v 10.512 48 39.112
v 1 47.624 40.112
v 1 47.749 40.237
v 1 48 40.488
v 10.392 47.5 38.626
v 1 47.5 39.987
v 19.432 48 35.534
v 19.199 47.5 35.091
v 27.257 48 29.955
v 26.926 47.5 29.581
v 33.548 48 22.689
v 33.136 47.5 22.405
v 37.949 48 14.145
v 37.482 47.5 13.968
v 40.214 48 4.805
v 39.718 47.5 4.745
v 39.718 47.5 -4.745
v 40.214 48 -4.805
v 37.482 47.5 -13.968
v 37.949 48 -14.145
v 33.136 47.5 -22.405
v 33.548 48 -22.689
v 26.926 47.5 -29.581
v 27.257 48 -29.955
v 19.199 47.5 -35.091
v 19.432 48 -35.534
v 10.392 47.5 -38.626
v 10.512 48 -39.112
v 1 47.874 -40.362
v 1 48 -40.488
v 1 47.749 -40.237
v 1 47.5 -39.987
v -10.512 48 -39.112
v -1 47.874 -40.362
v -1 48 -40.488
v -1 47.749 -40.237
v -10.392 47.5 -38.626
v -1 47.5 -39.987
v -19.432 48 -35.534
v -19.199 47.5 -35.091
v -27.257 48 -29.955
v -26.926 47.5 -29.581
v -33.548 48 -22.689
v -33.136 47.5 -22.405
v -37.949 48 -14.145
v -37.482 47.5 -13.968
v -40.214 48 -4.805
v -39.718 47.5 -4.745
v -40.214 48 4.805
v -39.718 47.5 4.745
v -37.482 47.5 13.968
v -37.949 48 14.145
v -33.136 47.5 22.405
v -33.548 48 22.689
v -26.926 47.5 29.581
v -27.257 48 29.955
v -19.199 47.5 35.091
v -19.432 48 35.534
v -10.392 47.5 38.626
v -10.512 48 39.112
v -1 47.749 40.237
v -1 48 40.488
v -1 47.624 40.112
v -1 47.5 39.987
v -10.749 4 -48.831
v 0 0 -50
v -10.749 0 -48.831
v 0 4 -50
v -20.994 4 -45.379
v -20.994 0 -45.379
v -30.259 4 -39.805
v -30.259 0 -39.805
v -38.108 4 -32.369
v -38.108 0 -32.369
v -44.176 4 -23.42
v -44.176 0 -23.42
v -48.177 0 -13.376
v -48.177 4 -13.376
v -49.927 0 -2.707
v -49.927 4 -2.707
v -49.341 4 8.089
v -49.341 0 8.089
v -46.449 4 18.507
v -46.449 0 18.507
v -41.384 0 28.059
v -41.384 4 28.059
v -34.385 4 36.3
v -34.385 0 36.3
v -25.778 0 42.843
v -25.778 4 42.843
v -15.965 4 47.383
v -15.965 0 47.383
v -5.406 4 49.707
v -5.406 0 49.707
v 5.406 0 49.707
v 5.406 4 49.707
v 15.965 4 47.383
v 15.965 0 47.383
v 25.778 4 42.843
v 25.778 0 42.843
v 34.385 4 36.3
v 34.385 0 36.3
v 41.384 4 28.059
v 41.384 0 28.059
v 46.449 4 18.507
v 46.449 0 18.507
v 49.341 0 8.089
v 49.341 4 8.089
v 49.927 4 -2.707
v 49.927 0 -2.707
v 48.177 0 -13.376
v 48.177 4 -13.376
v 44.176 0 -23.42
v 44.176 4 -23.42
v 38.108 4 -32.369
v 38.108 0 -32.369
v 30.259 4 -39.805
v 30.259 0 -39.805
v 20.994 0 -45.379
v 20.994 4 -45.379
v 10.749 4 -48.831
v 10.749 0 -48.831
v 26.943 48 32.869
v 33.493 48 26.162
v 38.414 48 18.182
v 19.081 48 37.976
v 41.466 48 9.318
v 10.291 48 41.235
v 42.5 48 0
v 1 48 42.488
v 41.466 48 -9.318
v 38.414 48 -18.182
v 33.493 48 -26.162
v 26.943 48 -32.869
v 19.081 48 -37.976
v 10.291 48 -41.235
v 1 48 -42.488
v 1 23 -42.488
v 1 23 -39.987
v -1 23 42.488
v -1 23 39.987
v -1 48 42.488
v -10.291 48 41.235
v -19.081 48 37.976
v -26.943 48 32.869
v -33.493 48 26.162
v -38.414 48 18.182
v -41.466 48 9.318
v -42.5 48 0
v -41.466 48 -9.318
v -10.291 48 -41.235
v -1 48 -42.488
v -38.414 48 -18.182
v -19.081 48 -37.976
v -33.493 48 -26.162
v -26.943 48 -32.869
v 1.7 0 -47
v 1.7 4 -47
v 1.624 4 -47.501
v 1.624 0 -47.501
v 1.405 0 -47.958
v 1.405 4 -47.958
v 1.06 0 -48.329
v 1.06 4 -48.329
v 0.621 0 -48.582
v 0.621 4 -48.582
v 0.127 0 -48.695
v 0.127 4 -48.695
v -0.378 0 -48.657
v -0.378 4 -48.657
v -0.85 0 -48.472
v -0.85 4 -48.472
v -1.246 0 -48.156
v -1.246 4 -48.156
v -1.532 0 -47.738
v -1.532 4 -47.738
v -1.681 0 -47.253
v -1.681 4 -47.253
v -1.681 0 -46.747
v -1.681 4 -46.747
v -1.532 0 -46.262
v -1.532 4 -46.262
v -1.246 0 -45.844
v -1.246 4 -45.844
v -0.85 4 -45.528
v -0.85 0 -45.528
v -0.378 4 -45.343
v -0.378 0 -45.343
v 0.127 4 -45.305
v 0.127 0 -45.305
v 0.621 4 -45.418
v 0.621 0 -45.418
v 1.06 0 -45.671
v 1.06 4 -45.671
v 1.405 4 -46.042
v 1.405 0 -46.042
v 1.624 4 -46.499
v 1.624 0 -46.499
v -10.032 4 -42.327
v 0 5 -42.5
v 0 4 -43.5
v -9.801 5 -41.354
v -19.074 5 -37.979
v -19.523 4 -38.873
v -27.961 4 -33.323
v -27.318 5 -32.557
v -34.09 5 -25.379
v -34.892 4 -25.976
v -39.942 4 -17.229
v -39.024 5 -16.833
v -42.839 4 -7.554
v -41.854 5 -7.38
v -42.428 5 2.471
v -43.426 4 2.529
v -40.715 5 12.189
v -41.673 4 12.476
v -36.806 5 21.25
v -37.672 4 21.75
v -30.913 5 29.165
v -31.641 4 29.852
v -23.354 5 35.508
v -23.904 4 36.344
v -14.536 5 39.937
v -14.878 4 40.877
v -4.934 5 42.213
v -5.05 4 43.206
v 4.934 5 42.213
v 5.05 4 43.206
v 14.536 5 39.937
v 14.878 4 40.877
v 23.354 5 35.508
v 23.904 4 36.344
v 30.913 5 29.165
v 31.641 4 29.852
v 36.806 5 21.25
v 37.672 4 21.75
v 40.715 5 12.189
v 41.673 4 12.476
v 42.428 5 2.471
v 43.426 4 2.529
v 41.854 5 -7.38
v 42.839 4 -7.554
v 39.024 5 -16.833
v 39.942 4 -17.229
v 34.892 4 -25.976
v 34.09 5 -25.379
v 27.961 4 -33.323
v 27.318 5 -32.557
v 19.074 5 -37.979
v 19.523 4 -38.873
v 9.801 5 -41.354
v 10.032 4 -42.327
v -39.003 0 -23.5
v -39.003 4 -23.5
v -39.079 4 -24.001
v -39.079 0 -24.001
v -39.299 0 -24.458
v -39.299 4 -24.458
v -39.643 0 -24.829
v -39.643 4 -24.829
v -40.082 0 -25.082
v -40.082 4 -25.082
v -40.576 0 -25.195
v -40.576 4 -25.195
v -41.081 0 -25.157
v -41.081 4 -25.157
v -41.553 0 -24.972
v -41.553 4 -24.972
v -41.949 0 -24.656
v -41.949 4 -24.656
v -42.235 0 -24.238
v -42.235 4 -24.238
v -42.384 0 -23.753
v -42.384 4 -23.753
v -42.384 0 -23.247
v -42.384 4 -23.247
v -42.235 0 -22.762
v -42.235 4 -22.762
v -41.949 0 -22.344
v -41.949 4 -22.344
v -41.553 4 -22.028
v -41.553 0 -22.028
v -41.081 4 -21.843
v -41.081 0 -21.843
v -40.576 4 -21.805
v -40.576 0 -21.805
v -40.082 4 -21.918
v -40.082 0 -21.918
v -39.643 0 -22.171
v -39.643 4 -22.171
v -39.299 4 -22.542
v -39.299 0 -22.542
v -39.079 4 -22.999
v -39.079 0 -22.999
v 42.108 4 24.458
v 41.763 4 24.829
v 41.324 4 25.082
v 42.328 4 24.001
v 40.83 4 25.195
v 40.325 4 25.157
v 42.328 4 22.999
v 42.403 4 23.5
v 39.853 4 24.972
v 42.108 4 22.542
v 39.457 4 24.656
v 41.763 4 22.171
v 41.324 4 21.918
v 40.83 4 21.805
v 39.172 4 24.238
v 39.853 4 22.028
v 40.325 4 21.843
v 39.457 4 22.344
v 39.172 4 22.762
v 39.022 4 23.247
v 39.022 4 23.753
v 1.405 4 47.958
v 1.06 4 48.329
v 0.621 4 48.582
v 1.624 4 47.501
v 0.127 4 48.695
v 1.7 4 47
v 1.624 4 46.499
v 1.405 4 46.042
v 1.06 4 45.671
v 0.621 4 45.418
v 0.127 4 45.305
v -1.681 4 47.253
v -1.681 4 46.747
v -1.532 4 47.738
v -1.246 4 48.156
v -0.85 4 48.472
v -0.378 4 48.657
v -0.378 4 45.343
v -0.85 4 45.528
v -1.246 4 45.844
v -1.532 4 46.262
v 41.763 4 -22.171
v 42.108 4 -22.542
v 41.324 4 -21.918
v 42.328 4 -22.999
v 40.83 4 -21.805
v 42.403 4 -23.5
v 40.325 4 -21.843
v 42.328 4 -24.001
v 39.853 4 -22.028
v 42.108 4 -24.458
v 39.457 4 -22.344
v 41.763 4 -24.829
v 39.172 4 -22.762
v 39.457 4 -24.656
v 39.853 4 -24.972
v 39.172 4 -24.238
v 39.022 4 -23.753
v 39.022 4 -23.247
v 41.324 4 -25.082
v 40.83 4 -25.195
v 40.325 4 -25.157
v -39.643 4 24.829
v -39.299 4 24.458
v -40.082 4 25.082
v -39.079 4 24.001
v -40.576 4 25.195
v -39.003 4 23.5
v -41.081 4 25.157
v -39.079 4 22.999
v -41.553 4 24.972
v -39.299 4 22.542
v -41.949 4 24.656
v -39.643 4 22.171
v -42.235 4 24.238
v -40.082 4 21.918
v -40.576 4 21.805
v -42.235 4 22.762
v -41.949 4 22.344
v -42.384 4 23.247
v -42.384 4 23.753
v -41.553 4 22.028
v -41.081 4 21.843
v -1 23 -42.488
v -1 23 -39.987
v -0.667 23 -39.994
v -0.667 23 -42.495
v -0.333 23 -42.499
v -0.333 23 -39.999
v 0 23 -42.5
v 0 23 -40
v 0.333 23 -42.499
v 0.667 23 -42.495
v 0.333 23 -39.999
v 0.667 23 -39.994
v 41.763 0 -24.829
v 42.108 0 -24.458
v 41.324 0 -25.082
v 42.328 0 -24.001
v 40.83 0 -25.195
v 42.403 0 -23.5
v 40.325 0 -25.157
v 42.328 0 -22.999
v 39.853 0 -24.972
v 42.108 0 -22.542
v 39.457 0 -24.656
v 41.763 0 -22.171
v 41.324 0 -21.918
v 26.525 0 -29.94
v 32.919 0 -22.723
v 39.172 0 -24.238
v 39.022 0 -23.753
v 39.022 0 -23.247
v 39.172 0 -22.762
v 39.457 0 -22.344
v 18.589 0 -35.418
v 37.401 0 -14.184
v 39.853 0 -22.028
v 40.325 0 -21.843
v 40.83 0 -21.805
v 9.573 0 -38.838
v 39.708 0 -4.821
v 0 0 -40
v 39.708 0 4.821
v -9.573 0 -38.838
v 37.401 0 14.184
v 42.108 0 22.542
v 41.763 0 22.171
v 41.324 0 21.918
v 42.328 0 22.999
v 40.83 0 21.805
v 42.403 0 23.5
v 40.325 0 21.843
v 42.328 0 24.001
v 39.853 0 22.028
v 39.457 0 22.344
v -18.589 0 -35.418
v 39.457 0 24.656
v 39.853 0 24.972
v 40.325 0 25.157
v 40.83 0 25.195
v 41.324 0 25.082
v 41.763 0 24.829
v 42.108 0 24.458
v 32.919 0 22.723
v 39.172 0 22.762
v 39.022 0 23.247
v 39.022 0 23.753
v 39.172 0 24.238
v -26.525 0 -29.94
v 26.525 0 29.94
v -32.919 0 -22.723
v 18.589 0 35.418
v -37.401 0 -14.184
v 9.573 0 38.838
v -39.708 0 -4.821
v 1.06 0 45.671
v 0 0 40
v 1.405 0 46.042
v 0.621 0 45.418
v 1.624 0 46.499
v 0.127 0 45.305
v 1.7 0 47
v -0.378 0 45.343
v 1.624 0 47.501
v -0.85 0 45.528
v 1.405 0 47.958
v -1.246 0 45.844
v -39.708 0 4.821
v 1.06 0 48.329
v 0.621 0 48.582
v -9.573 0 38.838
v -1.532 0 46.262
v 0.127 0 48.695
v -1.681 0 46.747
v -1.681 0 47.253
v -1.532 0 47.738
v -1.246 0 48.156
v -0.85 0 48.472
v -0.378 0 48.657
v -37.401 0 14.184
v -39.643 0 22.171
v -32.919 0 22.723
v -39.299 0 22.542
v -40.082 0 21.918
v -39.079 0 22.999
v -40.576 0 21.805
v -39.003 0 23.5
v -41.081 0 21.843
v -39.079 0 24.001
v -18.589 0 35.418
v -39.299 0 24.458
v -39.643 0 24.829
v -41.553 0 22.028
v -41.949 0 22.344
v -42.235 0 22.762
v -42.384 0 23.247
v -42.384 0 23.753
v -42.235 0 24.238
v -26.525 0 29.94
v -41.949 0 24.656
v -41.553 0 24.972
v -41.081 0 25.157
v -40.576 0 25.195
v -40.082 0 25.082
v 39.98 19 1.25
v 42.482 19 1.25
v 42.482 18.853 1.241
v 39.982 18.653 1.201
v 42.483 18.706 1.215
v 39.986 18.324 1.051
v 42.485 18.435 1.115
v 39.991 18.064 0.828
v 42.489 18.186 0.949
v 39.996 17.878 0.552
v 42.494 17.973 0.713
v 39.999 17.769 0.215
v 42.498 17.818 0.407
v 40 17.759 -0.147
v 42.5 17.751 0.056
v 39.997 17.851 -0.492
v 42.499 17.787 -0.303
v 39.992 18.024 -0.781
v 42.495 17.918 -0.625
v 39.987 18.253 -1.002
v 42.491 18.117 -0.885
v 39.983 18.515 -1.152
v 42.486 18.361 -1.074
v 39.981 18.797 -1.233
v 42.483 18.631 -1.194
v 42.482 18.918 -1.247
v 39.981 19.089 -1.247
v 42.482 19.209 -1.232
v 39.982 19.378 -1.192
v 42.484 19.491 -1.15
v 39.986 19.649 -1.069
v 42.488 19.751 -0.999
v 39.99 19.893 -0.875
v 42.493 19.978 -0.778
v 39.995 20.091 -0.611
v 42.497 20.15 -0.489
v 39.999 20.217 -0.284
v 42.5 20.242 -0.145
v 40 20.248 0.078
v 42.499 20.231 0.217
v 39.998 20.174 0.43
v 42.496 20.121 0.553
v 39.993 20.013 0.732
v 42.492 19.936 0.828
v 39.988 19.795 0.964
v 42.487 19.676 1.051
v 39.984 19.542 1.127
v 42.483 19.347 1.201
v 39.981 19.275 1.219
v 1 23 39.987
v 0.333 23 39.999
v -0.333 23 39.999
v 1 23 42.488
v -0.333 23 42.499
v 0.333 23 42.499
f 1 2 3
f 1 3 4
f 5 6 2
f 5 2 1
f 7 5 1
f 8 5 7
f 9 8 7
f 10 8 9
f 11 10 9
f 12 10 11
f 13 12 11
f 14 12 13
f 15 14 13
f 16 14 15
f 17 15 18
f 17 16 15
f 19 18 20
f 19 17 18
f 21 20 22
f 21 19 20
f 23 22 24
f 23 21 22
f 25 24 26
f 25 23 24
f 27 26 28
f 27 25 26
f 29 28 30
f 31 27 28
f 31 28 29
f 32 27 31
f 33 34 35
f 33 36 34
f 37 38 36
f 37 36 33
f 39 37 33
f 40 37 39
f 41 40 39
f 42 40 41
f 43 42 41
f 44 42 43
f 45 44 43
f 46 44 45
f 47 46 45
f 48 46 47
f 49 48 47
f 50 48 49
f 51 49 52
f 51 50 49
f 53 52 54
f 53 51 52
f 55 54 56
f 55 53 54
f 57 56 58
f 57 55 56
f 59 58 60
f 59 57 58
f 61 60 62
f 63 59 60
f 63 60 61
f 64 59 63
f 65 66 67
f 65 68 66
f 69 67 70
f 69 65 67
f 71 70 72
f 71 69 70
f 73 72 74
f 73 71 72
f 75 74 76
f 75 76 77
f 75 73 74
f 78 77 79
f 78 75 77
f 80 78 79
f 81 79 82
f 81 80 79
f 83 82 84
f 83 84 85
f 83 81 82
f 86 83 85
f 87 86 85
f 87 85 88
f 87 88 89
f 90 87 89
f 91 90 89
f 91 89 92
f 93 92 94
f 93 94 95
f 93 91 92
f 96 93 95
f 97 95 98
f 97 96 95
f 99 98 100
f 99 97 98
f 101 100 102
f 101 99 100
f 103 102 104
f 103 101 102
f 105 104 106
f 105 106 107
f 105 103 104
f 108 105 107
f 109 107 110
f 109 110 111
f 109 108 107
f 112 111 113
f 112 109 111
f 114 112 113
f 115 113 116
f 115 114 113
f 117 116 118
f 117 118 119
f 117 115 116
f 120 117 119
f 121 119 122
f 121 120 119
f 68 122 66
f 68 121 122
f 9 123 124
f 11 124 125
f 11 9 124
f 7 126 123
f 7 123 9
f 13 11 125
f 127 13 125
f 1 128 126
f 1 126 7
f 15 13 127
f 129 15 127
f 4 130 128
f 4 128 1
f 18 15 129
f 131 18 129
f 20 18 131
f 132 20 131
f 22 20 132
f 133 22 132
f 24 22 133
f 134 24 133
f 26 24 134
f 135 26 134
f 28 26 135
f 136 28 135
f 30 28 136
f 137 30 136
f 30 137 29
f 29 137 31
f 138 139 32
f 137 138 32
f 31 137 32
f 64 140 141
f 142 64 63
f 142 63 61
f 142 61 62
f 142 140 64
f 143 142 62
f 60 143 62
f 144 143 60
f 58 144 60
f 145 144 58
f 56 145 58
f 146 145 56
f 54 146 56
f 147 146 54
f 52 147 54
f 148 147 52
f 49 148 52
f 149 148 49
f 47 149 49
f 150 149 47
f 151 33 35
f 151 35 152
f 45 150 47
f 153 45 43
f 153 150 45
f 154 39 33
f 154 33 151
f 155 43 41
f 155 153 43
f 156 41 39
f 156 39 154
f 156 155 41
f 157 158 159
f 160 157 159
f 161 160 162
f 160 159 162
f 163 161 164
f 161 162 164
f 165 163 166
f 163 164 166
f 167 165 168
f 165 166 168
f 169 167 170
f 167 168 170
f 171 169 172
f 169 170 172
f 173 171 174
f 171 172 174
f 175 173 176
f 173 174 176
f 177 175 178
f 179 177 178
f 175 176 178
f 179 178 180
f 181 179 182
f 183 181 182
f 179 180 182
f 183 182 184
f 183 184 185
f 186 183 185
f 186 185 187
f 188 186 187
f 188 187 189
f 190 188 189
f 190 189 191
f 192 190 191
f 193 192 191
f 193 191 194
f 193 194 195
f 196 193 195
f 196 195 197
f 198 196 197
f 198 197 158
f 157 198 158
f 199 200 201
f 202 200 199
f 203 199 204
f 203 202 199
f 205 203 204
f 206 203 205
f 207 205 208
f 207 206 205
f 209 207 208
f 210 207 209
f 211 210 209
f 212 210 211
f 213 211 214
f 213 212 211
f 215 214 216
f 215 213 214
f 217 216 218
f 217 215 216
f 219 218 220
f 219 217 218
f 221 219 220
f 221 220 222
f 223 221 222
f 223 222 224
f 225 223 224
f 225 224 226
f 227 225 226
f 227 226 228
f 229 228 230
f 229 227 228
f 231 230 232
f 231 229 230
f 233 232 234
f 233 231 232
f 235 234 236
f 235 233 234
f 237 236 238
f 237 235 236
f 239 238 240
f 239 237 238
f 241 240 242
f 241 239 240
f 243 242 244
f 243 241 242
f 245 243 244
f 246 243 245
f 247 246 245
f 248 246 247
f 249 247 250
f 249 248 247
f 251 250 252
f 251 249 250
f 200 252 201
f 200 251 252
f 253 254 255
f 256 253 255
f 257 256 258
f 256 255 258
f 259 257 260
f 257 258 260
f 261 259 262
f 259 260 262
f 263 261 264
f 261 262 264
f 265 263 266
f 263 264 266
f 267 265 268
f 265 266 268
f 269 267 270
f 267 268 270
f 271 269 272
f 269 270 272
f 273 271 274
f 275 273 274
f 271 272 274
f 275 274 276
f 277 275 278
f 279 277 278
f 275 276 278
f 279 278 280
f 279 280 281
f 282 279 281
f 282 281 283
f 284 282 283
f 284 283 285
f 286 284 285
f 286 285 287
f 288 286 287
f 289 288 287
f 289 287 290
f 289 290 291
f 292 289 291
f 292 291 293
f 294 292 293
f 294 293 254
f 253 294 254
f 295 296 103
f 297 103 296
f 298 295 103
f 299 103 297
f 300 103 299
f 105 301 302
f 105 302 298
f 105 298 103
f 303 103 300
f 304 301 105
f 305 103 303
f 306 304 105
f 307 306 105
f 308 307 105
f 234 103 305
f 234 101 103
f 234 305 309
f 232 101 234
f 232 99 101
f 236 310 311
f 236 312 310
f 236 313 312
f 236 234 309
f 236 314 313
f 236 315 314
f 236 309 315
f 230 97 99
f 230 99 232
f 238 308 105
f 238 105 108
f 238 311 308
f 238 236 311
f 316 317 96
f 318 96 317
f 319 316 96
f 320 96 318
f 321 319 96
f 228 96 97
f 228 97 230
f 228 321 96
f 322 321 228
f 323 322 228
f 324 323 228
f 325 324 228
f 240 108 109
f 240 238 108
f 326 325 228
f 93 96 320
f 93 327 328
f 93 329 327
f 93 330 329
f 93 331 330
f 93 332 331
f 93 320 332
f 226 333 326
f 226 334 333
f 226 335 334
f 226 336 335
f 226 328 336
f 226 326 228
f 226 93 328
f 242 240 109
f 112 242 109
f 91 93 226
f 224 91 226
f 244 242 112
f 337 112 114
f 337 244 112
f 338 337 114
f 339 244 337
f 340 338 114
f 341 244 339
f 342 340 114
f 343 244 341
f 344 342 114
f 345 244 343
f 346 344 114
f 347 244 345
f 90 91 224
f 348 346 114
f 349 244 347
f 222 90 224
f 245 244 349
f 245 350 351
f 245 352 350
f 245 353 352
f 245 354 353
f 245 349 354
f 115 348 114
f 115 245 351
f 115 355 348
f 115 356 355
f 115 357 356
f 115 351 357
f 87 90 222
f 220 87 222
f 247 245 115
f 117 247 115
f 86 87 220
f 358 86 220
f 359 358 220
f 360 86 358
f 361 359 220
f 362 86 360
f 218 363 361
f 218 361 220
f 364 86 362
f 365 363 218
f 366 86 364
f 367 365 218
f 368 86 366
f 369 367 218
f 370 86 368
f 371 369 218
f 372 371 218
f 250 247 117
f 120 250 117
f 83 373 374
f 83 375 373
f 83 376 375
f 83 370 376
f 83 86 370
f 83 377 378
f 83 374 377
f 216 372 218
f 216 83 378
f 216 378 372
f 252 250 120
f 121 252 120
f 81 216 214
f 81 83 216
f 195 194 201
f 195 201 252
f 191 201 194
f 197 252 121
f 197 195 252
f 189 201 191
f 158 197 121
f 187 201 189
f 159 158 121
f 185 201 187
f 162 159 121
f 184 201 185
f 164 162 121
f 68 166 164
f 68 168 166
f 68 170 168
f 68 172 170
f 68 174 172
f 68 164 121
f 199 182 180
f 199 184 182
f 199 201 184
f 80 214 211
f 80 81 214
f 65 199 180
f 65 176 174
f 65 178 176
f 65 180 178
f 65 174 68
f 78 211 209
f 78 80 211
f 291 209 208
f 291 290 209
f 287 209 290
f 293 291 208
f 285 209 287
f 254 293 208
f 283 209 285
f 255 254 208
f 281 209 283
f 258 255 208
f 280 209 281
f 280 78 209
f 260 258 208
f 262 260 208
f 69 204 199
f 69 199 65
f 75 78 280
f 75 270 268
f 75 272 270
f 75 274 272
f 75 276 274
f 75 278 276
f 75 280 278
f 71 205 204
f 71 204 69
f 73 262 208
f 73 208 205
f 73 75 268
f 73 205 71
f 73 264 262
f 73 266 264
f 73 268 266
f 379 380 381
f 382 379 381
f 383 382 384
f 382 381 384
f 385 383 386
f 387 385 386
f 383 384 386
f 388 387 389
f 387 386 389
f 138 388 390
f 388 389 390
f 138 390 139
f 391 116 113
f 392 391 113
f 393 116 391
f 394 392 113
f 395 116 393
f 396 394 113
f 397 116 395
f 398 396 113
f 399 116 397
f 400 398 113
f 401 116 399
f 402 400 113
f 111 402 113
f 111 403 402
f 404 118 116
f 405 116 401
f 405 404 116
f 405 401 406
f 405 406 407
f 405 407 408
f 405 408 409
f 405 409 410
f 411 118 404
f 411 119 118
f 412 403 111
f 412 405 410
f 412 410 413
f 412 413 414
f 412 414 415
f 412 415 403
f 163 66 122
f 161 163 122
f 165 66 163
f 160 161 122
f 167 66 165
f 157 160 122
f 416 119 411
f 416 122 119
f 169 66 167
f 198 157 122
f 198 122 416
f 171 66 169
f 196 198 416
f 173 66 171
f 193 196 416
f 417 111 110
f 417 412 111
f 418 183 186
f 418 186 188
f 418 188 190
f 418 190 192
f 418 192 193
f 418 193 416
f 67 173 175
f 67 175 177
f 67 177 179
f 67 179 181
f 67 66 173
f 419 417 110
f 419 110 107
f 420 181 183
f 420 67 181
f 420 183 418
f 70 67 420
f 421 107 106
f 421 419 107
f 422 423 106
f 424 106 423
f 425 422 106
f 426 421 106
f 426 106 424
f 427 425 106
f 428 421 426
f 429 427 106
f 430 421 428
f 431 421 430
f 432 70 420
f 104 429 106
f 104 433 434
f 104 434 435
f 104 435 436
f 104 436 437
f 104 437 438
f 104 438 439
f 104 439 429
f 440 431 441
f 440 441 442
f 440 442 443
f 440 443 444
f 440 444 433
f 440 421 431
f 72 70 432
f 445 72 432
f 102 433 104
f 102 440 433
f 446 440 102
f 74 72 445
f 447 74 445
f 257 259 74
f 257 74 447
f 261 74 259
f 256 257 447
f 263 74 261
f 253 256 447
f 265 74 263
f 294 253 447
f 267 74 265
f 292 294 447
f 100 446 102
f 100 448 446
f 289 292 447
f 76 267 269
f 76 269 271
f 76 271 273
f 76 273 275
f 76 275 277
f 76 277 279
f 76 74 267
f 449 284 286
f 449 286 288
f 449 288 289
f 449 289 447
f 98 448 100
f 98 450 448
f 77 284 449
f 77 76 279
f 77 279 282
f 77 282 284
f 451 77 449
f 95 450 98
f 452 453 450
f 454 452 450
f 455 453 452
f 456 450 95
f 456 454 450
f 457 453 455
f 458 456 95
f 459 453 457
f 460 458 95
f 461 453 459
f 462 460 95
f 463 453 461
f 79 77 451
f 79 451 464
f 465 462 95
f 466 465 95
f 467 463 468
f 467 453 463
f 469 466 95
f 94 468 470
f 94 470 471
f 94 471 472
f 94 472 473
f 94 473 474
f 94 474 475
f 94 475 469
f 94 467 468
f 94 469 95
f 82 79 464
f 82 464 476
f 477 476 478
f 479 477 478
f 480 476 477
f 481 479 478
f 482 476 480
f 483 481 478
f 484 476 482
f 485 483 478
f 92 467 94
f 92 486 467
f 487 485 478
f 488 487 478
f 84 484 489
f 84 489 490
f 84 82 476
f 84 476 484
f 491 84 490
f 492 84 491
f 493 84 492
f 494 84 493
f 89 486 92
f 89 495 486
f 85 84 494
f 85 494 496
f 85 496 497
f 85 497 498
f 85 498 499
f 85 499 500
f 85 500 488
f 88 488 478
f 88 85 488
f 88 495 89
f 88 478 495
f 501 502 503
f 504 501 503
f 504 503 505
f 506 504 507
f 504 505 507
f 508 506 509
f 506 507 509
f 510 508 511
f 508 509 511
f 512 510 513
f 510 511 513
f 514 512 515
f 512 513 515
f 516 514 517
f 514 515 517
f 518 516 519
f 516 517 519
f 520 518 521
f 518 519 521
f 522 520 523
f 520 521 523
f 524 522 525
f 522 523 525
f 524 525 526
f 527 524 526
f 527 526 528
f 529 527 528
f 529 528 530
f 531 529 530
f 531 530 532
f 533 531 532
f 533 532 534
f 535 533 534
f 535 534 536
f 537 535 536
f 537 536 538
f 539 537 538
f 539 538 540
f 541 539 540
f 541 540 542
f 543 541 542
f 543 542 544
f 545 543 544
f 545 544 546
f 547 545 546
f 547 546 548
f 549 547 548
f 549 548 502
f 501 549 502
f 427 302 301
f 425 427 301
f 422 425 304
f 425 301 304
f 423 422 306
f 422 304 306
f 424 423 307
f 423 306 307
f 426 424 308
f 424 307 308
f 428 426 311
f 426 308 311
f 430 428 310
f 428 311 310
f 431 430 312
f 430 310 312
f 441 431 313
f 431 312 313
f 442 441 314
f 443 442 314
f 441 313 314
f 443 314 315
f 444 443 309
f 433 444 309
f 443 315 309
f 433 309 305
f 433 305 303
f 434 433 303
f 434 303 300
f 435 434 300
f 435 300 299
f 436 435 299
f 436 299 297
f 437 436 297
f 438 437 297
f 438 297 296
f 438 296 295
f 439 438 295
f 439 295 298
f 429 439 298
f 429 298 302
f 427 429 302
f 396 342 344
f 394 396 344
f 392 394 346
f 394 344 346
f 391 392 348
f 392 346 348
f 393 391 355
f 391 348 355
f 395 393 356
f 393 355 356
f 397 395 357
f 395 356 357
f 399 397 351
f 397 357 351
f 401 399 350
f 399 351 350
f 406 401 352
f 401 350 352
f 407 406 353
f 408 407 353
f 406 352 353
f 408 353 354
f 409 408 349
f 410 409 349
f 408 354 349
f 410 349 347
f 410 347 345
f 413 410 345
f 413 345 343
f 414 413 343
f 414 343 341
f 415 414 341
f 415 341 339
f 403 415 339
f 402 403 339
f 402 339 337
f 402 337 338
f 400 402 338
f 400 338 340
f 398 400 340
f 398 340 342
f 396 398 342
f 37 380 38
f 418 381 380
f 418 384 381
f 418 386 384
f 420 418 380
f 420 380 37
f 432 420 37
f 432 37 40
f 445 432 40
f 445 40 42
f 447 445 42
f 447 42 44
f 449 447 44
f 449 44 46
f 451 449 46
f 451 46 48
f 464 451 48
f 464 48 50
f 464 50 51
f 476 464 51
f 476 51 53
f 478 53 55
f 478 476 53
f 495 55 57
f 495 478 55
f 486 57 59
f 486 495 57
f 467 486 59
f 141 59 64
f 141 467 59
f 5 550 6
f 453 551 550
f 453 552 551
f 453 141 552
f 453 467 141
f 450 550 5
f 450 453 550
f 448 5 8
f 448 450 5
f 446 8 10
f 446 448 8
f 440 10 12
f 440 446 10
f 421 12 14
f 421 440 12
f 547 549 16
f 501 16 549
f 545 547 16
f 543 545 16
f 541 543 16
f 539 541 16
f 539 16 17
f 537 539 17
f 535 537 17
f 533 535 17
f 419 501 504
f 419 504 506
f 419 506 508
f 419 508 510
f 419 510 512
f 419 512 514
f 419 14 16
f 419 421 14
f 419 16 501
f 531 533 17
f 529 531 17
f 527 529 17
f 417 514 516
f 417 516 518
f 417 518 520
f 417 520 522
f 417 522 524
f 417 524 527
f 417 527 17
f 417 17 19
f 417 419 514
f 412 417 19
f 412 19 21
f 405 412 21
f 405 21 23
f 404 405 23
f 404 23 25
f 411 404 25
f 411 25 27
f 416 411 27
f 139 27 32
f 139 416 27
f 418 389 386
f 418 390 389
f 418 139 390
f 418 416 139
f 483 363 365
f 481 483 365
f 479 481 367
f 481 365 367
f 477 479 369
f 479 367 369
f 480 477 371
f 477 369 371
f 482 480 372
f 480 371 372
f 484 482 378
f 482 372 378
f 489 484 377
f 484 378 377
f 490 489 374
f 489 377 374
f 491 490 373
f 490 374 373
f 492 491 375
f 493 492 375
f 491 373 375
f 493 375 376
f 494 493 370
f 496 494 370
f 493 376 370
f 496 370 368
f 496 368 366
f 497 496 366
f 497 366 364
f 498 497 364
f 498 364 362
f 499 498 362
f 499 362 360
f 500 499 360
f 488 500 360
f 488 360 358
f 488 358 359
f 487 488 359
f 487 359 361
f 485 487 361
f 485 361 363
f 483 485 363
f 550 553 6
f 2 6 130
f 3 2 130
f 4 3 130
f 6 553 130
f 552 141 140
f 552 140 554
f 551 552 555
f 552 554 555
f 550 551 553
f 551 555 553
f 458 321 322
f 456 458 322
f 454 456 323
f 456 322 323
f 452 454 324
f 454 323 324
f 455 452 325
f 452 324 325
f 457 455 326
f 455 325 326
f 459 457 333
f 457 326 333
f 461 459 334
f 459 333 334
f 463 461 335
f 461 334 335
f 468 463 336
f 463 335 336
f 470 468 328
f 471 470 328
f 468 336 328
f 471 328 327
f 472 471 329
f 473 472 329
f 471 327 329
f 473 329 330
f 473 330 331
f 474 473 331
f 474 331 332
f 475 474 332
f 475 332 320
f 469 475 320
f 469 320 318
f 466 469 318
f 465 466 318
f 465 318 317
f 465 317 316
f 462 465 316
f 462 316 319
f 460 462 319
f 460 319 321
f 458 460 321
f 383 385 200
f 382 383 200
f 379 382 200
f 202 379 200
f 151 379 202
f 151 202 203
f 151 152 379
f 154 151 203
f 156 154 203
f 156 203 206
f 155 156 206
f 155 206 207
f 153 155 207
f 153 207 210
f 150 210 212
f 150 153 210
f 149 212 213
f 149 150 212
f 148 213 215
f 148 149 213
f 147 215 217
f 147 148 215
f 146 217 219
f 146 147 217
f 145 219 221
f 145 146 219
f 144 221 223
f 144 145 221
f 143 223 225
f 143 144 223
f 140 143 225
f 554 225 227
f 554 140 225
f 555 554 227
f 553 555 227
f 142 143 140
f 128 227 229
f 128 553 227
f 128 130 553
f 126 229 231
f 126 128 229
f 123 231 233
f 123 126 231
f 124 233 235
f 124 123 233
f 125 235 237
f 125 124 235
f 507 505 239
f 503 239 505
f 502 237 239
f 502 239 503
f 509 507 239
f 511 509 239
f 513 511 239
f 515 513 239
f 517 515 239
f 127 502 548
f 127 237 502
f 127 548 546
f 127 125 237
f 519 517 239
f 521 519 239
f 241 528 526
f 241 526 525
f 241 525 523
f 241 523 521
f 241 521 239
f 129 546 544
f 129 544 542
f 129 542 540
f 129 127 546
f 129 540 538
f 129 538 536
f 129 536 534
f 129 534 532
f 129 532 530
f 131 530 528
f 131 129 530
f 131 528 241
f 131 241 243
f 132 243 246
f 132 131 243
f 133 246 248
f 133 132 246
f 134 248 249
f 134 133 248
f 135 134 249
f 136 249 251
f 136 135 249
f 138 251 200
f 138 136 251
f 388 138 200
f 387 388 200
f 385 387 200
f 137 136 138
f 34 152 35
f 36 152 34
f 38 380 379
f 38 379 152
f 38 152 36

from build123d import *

# Parameters (mm, degrees)
CHAMFER_1_SIZE            = 1
CHAMFER_2_SIZE            = 0.5
SKETCH_2_W                = 2
SKETCH_2_H                = 25
CUT_EXTRUDE_695_DEPTH     = 50
HOLE_WIZARD_M3_1_D        = 3.4
HOLE_WIZARD_M3_1_2_REACH  = 111.075
HOLE_WIZARD_M3_1_2_BORE_R = 1.25


with BuildPart() as part:
    # 草图1 → 旋转1 (revolve)
    with BuildSketch(Plane.XY, mode=Mode.PRIVATE) as revolve_1_sk:
        Polygon((40, 0), (50, 0), (50, 4), (42.5, 4), (42.5, 48), (40, 48), align=None)
    revolve(revolve_1_sk.sketch.rotate(Axis((0, 0, 0), (0, 1, 0)), 90), axis=Axis((0, 0, 0), (0, 1, 0)))

    # 倒角1
    chamfer_1_edges = [part.edges().sort_by_distance(p)[0] for p in [
        (0, 4, 42.5),
    ]]
    chamfer(chamfer_1_edges, length=CHAMFER_1_SIZE)

    # 倒角2
    chamfer_2_edges = [part.edges().sort_by_distance(p)[0] for p in [
        (0, 48, 40),
    ]]
    chamfer(chamfer_2_edges, length=CHAMFER_2_SIZE)

    # 草图2 → Cut-Extrude 695 (cut, symmetric)
    with BuildSketch(Plane.XY):
        with Locations((0, 35.5)):
            Rectangle(SKETCH_2_W, SKETCH_2_H)
    extrude(amount=CUT_EXTRUDE_695_DEPTH, both=True, mode=Mode.SUBTRACT)

    # Hole Wizard M3 _1 (through all)
    with Locations(Plane(origin=(0, 0, 0), x_dir=(-1, 0, 0), z_dir=(0, -1, 0))):
        with Locations((0, 47), (40.703193978, 23.5), (40.703193978, -23.5), (0, -47), (-40.703193978, -23.5), (-40.703193978, 23.5)):
            Hole(HOLE_WIZARD_M3_1_D / 2)

    # Hole Wizard M3 _1 2 bore (on position points) → Hole Wizard M3 _1 2 (cut, up to next)
    with BuildSketch(Plane(origin=(42.5, 19, 0), x_dir=(0, 0, 1), z_dir=(1, 0, 0)), mode=Mode.PRIVATE) as hole_wizard_m3_1_2_sk1:
        Circle(HOLE_WIZARD_M3_1_2_BORE_R)
    hole_wizard_m3_1_2_tool1 = extrude(hole_wizard_m3_1_2_sk1.sketch, amount=-HOLE_WIZARD_M3_1_2_REACH, mode=Mode.PRIVATE) & part.part
    add(hole_wizard_m3_1_2_tool1.solids().sort_by_distance((42.5, 19, 0))[0], mode=Mode.SUBTRACT)


solid = part.part
